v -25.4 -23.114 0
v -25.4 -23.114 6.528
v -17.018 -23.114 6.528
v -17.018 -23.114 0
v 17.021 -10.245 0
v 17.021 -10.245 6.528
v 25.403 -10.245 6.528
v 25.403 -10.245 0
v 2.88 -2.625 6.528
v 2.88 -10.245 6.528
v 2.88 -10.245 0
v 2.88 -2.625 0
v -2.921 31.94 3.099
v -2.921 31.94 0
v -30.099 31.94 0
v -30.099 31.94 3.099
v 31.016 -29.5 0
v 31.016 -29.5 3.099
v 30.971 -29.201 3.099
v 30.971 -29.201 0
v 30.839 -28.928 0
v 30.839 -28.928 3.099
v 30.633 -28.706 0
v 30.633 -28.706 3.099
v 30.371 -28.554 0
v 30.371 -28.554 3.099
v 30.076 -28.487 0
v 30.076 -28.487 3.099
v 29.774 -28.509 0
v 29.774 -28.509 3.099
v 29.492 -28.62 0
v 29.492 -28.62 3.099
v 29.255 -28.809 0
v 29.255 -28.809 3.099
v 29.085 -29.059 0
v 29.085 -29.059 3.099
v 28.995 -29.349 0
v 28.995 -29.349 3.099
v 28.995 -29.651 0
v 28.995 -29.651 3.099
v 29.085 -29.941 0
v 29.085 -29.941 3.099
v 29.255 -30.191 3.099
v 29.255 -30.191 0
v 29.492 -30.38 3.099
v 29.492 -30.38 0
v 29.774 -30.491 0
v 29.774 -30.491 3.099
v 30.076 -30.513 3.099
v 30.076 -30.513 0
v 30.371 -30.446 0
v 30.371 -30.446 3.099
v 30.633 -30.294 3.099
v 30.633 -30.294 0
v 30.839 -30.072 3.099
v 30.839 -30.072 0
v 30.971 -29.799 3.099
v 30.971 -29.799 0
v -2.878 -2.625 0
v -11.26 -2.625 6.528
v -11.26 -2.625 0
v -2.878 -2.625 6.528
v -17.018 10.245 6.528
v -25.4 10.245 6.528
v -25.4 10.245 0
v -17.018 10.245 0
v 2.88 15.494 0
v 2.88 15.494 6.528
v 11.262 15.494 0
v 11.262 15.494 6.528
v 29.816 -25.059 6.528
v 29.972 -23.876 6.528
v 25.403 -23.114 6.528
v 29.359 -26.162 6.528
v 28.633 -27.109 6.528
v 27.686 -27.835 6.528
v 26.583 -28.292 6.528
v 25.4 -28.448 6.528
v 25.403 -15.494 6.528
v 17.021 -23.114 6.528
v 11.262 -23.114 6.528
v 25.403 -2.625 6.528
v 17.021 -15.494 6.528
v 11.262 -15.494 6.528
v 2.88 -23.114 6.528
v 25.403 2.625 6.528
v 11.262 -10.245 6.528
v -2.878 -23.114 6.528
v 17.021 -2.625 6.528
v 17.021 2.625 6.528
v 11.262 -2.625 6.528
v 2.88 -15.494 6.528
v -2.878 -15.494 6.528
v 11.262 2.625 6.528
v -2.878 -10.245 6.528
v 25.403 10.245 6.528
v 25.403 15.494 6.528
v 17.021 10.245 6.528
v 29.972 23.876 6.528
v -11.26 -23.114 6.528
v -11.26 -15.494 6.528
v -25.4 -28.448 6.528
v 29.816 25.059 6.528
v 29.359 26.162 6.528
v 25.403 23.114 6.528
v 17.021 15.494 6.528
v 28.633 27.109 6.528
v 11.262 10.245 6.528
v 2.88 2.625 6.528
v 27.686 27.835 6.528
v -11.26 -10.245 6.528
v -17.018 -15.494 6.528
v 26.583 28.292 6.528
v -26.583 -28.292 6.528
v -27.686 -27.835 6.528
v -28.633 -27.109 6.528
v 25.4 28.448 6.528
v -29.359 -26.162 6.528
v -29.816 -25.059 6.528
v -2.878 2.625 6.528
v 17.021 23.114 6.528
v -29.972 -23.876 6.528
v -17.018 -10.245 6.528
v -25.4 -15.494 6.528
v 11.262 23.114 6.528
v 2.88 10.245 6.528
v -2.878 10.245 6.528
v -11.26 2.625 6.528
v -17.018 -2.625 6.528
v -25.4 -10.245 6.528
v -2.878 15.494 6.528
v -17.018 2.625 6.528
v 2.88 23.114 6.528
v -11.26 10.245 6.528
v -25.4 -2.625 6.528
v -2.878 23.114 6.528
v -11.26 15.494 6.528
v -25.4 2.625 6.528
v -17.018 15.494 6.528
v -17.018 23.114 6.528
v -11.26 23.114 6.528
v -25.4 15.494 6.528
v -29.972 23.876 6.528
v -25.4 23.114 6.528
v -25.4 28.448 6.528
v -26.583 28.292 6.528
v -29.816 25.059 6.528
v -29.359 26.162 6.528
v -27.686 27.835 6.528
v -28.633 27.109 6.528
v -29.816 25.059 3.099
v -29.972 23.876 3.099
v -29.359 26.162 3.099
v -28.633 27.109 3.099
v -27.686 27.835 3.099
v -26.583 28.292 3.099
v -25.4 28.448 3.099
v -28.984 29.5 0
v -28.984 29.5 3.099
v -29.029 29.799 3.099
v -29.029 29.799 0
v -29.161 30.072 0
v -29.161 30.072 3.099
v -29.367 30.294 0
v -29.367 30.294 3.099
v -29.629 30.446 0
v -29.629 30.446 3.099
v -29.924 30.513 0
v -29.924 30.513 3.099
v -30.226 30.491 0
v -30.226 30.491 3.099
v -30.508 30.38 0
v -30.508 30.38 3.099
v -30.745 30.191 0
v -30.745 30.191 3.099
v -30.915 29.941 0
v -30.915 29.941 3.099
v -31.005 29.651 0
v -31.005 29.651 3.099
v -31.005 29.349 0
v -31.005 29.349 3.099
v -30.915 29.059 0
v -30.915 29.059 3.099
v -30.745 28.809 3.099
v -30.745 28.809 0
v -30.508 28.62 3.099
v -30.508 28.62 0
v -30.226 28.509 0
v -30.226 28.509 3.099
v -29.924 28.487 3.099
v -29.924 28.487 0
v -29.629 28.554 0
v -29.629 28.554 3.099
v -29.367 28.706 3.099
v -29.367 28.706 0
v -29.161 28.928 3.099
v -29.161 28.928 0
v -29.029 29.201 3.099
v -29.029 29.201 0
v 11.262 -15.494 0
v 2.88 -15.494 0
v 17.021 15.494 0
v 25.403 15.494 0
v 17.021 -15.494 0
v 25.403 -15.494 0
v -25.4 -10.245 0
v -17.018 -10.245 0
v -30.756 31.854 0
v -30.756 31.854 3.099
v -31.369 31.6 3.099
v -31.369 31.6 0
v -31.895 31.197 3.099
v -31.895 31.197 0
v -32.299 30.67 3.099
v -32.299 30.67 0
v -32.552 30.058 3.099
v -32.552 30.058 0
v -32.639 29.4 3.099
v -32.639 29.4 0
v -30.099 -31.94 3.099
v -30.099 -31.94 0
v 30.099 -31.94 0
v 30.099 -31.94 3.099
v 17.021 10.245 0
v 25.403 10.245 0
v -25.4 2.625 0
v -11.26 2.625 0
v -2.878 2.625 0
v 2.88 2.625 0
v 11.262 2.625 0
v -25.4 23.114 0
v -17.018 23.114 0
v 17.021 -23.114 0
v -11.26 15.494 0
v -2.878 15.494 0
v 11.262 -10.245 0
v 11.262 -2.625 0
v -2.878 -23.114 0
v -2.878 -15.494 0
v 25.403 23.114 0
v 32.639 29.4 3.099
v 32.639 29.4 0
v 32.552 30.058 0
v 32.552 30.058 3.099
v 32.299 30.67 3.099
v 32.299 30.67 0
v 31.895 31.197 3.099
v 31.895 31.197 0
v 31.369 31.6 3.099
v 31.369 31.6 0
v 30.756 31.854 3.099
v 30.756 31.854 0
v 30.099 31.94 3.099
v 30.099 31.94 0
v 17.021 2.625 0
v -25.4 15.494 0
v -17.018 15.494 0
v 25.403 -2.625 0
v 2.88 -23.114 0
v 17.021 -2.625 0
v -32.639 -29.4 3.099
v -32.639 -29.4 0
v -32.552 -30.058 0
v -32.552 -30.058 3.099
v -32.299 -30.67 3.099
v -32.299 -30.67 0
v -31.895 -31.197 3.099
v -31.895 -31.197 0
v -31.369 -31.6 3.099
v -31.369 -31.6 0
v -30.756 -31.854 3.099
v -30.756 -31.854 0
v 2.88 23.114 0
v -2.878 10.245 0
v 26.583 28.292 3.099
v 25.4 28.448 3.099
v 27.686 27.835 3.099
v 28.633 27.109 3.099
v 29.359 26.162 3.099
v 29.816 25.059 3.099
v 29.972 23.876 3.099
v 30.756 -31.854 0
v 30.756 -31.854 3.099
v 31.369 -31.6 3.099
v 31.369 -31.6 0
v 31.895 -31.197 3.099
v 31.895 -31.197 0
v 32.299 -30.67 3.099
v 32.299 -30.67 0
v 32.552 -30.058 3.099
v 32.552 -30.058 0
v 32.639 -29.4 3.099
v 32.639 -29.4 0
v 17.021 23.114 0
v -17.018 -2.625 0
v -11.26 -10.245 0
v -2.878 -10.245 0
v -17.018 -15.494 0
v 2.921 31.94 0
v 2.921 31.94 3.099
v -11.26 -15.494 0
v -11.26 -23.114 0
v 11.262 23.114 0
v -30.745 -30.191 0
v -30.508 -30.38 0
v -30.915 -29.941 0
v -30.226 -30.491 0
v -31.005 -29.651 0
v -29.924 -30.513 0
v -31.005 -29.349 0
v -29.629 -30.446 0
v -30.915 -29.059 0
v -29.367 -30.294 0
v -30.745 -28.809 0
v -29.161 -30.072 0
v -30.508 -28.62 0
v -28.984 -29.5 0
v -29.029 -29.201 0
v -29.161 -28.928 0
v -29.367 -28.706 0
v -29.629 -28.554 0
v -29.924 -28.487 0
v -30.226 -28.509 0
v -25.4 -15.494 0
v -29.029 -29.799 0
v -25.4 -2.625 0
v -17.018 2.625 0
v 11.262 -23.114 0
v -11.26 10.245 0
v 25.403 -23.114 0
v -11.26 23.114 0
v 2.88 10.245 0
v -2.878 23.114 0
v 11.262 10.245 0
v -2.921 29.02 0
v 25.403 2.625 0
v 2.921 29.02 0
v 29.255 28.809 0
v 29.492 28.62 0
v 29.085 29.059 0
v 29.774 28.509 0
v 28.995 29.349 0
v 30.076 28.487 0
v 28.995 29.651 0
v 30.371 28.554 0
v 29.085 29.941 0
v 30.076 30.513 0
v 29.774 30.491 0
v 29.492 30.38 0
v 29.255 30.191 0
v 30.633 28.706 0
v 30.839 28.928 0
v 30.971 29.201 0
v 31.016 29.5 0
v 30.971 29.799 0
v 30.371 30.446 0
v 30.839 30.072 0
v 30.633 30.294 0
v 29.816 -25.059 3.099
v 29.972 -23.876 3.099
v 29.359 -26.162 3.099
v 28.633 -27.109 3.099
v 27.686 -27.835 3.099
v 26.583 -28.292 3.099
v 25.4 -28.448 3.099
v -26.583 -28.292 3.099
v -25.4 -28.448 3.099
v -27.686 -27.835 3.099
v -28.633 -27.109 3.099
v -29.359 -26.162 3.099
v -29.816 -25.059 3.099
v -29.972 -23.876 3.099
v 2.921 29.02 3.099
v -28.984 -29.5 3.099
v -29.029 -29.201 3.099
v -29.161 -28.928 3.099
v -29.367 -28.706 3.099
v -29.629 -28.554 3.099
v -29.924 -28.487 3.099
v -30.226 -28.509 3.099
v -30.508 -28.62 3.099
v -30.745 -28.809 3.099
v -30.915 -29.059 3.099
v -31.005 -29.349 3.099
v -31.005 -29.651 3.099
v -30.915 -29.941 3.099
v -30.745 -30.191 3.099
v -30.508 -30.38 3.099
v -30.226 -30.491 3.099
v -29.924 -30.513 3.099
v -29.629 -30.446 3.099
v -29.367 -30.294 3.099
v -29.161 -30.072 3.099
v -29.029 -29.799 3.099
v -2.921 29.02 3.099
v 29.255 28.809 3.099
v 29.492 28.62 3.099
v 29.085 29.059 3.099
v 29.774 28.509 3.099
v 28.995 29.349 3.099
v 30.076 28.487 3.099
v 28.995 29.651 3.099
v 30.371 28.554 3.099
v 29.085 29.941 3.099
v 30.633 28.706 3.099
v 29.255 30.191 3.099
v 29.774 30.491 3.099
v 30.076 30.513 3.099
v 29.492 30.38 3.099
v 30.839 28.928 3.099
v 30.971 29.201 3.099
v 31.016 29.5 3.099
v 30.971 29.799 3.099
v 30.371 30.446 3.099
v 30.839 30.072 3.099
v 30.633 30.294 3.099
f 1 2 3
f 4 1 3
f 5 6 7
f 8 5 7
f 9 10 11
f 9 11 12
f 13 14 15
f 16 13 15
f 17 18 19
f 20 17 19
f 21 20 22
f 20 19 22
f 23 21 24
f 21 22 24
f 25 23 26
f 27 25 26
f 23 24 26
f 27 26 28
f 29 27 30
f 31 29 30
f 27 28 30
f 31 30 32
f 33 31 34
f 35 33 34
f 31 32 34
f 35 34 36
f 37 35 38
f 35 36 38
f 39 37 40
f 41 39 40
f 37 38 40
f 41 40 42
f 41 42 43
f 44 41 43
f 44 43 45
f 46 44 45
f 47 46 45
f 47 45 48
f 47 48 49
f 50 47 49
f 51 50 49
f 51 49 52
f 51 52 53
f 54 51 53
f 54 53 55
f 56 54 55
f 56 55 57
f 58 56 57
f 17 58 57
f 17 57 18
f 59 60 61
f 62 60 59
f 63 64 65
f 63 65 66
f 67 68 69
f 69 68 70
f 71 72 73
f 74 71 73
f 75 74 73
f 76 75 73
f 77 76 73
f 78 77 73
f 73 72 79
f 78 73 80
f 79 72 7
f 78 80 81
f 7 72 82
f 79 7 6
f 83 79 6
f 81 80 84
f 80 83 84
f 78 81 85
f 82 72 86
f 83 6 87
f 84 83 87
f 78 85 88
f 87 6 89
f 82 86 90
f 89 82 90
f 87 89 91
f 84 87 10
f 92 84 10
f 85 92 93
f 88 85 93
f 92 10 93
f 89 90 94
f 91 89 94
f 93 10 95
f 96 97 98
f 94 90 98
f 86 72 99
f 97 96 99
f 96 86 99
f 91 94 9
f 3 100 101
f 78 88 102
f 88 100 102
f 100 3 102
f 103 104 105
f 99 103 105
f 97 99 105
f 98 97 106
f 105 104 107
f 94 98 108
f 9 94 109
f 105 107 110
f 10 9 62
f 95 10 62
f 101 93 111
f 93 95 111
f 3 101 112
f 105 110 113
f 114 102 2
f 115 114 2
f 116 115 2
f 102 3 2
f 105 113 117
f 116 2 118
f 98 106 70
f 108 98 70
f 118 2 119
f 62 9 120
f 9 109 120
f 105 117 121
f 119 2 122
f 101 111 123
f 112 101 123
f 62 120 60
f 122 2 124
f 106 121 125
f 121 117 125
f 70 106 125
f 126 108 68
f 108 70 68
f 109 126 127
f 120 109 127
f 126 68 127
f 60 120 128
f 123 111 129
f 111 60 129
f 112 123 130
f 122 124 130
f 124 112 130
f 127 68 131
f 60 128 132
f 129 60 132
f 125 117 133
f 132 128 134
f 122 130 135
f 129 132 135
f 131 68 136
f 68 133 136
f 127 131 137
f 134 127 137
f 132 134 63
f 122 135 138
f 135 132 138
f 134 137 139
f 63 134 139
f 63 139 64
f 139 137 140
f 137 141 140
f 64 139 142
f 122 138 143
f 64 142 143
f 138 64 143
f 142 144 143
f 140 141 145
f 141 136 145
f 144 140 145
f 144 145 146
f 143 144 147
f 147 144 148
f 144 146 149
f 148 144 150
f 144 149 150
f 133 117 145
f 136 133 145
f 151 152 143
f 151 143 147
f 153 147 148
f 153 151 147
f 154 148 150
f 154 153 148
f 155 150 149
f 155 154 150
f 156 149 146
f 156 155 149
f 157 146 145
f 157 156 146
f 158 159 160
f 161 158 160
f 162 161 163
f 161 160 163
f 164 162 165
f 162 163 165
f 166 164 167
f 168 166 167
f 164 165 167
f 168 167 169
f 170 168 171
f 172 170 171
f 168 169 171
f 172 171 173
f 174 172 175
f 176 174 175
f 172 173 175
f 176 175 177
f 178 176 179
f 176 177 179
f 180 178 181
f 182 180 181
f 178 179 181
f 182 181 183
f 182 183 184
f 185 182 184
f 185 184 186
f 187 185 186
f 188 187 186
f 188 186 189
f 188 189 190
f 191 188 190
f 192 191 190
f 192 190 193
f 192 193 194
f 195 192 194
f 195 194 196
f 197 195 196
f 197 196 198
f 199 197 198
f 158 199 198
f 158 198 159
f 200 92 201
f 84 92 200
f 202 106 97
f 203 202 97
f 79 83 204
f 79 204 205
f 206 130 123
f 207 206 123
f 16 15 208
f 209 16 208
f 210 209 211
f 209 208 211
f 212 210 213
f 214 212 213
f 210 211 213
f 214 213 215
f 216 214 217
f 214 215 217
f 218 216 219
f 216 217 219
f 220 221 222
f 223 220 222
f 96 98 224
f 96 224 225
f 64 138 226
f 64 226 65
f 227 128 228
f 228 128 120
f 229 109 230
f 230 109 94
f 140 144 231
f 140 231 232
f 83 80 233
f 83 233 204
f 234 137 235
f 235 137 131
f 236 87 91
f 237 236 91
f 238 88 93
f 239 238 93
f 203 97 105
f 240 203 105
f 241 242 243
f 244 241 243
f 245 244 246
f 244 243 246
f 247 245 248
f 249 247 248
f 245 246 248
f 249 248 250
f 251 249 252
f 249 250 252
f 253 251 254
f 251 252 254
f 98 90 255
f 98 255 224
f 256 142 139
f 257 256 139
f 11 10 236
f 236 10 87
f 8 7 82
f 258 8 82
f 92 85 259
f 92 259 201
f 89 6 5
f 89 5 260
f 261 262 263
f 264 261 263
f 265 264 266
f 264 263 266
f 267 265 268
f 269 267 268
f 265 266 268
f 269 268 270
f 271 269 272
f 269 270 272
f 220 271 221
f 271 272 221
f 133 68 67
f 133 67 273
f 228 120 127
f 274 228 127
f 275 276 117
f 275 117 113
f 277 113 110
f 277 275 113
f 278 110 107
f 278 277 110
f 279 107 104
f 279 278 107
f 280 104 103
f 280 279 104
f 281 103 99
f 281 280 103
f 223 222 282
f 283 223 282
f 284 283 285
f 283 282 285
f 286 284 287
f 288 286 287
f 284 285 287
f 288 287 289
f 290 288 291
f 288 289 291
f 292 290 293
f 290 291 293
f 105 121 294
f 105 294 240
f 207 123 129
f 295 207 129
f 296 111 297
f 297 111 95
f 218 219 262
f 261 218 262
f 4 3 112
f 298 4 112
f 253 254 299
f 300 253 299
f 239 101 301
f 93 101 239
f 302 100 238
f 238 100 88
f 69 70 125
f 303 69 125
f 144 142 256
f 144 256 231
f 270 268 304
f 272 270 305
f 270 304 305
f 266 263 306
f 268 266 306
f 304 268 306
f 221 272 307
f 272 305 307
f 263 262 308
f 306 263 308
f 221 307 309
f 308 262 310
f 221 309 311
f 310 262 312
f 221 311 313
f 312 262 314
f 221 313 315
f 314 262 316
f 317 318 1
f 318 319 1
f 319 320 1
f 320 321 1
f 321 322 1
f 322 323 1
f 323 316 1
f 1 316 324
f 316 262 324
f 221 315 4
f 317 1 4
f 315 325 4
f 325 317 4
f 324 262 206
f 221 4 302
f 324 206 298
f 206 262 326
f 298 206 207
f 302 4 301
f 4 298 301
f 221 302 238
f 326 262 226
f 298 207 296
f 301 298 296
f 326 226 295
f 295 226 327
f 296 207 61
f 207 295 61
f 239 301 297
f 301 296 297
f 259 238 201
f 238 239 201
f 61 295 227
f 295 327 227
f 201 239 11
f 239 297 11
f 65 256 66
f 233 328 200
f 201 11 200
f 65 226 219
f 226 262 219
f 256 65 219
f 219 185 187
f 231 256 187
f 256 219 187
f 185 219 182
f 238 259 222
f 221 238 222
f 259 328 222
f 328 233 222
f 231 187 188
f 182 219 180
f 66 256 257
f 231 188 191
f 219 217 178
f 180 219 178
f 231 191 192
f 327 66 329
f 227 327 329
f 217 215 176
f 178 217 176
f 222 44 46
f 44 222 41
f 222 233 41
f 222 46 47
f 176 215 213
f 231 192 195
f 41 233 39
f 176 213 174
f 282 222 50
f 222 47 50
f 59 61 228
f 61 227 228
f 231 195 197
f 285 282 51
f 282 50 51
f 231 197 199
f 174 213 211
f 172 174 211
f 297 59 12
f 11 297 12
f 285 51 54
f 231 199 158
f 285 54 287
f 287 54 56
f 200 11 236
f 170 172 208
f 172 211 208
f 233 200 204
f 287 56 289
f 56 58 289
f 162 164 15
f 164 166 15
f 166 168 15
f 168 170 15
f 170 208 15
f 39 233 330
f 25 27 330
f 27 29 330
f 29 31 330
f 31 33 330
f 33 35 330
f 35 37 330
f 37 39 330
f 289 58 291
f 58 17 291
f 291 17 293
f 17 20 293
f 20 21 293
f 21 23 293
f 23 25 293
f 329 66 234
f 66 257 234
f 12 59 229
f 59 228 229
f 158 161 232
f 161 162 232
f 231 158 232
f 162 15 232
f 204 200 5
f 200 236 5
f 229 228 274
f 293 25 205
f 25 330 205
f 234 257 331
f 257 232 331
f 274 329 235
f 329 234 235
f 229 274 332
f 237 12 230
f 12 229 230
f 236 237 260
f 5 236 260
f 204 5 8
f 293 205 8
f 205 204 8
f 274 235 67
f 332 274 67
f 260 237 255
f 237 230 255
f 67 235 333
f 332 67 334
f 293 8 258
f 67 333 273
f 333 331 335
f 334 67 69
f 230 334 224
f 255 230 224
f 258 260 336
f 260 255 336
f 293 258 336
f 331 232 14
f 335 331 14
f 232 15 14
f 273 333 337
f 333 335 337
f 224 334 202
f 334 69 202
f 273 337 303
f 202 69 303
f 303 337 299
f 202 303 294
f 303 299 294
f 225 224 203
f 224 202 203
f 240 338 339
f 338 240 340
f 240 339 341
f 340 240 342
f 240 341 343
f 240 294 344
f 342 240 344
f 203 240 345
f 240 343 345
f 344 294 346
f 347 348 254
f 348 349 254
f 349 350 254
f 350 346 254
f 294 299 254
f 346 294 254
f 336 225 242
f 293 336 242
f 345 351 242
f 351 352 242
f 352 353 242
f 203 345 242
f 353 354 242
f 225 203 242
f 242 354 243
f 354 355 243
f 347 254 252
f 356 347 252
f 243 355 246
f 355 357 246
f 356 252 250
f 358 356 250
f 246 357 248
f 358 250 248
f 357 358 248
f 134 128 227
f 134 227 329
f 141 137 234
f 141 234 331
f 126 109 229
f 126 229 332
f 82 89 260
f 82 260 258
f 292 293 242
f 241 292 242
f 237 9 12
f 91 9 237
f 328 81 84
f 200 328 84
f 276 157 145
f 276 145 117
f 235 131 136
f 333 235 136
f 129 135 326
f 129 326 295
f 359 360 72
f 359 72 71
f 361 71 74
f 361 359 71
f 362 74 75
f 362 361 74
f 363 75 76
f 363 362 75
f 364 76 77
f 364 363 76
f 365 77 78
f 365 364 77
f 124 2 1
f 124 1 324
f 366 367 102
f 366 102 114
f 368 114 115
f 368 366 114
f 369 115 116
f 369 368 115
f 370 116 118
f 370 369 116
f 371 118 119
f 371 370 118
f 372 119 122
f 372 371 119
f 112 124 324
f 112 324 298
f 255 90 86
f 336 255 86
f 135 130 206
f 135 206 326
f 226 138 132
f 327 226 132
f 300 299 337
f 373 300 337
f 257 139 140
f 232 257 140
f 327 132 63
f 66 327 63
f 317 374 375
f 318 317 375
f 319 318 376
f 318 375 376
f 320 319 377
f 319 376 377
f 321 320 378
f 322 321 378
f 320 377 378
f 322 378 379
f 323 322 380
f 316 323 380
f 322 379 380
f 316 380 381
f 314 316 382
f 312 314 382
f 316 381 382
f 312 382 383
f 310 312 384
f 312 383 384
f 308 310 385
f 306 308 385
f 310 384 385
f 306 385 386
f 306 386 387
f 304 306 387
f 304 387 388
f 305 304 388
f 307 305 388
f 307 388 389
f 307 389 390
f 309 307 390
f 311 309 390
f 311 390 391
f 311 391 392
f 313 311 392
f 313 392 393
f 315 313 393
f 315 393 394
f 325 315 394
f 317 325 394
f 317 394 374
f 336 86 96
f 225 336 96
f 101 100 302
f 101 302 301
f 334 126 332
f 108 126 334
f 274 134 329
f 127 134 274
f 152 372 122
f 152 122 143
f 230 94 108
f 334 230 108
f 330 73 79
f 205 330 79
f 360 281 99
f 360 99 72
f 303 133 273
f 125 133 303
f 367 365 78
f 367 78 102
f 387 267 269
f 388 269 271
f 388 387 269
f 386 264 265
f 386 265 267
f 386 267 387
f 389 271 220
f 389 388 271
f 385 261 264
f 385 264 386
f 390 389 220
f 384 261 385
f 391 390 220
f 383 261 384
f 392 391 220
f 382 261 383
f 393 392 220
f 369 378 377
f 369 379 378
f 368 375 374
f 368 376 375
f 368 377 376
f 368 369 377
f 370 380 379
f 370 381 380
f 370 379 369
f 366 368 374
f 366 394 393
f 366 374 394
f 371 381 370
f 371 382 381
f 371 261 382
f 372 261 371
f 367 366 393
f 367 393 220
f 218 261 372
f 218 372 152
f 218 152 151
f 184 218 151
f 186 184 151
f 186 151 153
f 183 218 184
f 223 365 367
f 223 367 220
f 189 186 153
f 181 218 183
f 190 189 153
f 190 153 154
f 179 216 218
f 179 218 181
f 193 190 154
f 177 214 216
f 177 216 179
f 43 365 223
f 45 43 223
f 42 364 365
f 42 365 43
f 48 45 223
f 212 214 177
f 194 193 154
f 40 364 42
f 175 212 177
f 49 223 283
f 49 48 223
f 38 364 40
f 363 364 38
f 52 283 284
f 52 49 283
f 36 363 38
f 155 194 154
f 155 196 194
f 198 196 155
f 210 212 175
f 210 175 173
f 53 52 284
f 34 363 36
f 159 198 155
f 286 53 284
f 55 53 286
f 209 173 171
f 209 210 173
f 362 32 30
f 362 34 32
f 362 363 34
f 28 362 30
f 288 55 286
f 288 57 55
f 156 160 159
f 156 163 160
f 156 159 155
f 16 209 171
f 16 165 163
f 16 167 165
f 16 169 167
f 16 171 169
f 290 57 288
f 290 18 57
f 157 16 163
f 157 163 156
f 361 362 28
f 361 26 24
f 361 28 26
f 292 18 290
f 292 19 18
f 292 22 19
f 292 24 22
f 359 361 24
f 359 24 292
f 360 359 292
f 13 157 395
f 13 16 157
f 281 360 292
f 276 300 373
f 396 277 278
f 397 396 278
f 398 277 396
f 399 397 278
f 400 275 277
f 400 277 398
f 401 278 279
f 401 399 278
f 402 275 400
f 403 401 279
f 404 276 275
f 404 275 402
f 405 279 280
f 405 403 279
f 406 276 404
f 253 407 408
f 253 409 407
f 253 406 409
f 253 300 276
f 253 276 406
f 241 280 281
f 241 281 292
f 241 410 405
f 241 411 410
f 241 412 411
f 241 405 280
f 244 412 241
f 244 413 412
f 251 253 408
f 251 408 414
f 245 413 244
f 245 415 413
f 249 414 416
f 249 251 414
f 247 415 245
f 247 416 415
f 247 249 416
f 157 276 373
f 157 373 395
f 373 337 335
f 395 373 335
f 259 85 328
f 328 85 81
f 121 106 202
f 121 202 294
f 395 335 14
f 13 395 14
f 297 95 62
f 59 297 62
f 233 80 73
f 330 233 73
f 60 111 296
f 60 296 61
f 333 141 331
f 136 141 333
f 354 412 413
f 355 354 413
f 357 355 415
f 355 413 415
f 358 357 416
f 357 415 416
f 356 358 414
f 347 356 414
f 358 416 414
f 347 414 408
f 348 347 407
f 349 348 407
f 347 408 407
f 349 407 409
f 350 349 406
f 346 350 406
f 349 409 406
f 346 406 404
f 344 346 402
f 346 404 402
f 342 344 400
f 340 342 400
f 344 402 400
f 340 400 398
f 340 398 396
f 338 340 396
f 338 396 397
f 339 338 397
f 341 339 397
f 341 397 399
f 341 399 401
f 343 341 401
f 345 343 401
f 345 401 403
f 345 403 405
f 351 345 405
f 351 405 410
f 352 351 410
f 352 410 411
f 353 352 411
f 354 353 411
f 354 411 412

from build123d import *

# Parameters (mm, degrees)
BASE_DEPTH        = 3.0988
SKETCH4_R         = 1.016
MOUNT_HOLES_DEPTH = 4.0988
EXTRUDE2_DEPTH    = 3.429
SKETCH3_W         = 8.382
SKETCH3_H         = 7.62
KEY_DEPTH         = 7.5278
KEYS_COUNT        = 4
KEYS_PITCH        = 14.14018
KEYS_COUNT_DIR2   = 4
KEYS_PITCH_DIR2   = 12.869418


with BuildPart() as part:
    # Sketch1 → base (new body)
    with BuildSketch(Plane.XY):
        with BuildLine():
            Line((-2.921, 31.9405), (-30.099, 31.9405))
            ThreePointArc((-30.099, 31.9405), (-31.895051224, 31.196551224), (-32.639, 29.4005))
            Line((-32.639, 29.4005), (-32.639, -29.4005))
            ThreePointArc((-32.639, -29.4005), (-31.895051224, -31.196551224), (-30.099, -31.9405))
            Line((-30.099, -31.9405), (30.099, -31.9405))
            ThreePointArc((30.099, -31.9405), (31.895051224, -31.196551224), (32.639, -29.4005))
            Line((32.639, -29.4005), (32.639, 29.4005))
            ThreePointArc((32.639, 29.4005), (31.895051224, 31.196551224), (30.099, 31.9405))
            Line((30.099, 31.9405), (2.921, 31.9405))
            Line((2.921, 31.9405), (2.921, 29.0195))
            Line((2.921, 29.0195), (-2.921, 29.0195))
            Line((-2.921, 29.0195), (-2.921, 31.9405))
        make_face()
    extrude(amount=BASE_DEPTH)

    # Sketch4 → mount holes (cut, through all)
    with BuildSketch(Plane.XY.offset(3.0988)):
        with Locations((-30, 29.5)):
            Circle(SKETCH4_R)
        with Locations((30, 29.5)):
            Circle(SKETCH4_R)
        with Locations((30, -29.5)):
            Circle(SKETCH4_R)
        with Locations((-30, -29.5)):
            Circle(SKETCH4_R)
    extrude(amount=-MOUNT_HOLES_DEPTH, mode=Mode.SUBTRACT)

    # Sketch2 → Extrude2 (add)
    with BuildSketch(Plane.XY.offset(3.0988)):
        with BuildLine():
            Line((-25.4, 28.448), (25.4, 28.448))
            ThreePointArc((25.4, 28.448), (28.632892204, 27.108892204), (29.972, 23.876))
            Line((29.972, 23.876), (29.972, -23.876))
            ThreePointArc((29.972, -23.876), (28.632892204, -27.108892204), (25.4, -28.448))
            Line((25.4, -28.448), (-25.4, -28.448))
            ThreePointArc((-25.4, -28.448), (-28.632892204, -27.108892204), (-29.972, -23.876))
            Line((-29.972, -23.876), (-29.972, 23.876))
            ThreePointArc((-29.972, 23.876), (-28.632892204, 27.108892204), (-25.4, 28.448))
        make_face()
    extrude(amount=EXTRUDE2_DEPTH)

    # Sketch3 → key (cut, through all)
    with BuildSketch(Plane.XY.offset(6.5278)):
        with Locations((-21.209, 19.304)):
            Rectangle(SKETCH3_W, SKETCH3_H)
    key = extrude(amount=-KEY_DEPTH, mode=Mode.SUBTRACT)

    # keys: key 4 × 4
    with Locations(*[(i * KEYS_PITCH, -j * KEYS_PITCH_DIR2, 0) for i in range(KEYS_COUNT) for j in range(KEYS_COUNT_DIR2) if (i, j) != (0, 0)]):
        add(key, mode=Mode.SUBTRACT)


solid = part.part
